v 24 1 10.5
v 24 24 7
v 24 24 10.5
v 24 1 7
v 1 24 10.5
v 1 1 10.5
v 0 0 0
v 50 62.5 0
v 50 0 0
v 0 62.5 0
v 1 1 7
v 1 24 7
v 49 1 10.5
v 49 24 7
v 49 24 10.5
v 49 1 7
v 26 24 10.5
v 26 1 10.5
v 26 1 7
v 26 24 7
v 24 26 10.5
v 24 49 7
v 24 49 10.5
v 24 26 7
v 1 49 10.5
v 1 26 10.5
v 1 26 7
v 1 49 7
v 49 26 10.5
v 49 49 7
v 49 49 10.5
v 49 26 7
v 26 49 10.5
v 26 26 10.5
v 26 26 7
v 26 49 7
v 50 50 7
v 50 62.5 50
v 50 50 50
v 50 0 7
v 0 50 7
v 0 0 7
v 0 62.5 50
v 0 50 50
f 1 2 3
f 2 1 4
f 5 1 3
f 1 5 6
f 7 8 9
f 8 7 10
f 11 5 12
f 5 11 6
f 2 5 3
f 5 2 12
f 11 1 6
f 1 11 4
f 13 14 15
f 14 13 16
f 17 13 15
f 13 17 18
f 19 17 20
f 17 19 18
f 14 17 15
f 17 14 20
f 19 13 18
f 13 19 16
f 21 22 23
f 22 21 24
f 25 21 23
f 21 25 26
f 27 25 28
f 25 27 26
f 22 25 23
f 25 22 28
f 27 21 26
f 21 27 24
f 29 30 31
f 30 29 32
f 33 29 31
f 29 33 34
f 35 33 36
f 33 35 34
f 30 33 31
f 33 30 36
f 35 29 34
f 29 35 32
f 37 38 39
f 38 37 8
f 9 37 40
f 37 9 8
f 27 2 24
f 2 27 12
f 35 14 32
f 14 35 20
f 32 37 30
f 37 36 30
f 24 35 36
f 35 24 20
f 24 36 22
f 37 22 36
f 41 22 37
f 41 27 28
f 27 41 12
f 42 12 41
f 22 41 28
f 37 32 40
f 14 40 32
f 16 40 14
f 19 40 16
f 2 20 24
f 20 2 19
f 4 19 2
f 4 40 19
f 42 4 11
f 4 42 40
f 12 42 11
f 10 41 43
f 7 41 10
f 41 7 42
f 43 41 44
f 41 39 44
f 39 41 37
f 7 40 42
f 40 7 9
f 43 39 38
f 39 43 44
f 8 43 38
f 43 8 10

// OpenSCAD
//translate([0,0,0]) color("LightGray") square([25,25],false);
//translate([25,0,0]) color("LightGray") square([25,25],false);
//translate([0,25,0]) color("LightGray") square([25,25],false);
//translate([25,25,0]) color("LightGray") square([25,25],false);

scale([2,2,2]) {
    //translate([0,50,0]) color("Gray") square([50,12.5],false);
    //translate([50,0,0]) color("Gray") square([12.5,50],false);
}

color("LightGray") {
    translate([1,1,0]) cube([23,23,6+4.5]);
    translate([25+1,1,0]) cube([23,23,6+4.5]);
    translate([1,25+1,0]) cube([23,23,6+4.5]);
    translate([25+1,25+1,0]) cube([23,23,6+4.5]);
}
color("Grey") {
    cube([50,50,7]);
    translate([0,50,0]) cube([50,12.5,50]);
}
